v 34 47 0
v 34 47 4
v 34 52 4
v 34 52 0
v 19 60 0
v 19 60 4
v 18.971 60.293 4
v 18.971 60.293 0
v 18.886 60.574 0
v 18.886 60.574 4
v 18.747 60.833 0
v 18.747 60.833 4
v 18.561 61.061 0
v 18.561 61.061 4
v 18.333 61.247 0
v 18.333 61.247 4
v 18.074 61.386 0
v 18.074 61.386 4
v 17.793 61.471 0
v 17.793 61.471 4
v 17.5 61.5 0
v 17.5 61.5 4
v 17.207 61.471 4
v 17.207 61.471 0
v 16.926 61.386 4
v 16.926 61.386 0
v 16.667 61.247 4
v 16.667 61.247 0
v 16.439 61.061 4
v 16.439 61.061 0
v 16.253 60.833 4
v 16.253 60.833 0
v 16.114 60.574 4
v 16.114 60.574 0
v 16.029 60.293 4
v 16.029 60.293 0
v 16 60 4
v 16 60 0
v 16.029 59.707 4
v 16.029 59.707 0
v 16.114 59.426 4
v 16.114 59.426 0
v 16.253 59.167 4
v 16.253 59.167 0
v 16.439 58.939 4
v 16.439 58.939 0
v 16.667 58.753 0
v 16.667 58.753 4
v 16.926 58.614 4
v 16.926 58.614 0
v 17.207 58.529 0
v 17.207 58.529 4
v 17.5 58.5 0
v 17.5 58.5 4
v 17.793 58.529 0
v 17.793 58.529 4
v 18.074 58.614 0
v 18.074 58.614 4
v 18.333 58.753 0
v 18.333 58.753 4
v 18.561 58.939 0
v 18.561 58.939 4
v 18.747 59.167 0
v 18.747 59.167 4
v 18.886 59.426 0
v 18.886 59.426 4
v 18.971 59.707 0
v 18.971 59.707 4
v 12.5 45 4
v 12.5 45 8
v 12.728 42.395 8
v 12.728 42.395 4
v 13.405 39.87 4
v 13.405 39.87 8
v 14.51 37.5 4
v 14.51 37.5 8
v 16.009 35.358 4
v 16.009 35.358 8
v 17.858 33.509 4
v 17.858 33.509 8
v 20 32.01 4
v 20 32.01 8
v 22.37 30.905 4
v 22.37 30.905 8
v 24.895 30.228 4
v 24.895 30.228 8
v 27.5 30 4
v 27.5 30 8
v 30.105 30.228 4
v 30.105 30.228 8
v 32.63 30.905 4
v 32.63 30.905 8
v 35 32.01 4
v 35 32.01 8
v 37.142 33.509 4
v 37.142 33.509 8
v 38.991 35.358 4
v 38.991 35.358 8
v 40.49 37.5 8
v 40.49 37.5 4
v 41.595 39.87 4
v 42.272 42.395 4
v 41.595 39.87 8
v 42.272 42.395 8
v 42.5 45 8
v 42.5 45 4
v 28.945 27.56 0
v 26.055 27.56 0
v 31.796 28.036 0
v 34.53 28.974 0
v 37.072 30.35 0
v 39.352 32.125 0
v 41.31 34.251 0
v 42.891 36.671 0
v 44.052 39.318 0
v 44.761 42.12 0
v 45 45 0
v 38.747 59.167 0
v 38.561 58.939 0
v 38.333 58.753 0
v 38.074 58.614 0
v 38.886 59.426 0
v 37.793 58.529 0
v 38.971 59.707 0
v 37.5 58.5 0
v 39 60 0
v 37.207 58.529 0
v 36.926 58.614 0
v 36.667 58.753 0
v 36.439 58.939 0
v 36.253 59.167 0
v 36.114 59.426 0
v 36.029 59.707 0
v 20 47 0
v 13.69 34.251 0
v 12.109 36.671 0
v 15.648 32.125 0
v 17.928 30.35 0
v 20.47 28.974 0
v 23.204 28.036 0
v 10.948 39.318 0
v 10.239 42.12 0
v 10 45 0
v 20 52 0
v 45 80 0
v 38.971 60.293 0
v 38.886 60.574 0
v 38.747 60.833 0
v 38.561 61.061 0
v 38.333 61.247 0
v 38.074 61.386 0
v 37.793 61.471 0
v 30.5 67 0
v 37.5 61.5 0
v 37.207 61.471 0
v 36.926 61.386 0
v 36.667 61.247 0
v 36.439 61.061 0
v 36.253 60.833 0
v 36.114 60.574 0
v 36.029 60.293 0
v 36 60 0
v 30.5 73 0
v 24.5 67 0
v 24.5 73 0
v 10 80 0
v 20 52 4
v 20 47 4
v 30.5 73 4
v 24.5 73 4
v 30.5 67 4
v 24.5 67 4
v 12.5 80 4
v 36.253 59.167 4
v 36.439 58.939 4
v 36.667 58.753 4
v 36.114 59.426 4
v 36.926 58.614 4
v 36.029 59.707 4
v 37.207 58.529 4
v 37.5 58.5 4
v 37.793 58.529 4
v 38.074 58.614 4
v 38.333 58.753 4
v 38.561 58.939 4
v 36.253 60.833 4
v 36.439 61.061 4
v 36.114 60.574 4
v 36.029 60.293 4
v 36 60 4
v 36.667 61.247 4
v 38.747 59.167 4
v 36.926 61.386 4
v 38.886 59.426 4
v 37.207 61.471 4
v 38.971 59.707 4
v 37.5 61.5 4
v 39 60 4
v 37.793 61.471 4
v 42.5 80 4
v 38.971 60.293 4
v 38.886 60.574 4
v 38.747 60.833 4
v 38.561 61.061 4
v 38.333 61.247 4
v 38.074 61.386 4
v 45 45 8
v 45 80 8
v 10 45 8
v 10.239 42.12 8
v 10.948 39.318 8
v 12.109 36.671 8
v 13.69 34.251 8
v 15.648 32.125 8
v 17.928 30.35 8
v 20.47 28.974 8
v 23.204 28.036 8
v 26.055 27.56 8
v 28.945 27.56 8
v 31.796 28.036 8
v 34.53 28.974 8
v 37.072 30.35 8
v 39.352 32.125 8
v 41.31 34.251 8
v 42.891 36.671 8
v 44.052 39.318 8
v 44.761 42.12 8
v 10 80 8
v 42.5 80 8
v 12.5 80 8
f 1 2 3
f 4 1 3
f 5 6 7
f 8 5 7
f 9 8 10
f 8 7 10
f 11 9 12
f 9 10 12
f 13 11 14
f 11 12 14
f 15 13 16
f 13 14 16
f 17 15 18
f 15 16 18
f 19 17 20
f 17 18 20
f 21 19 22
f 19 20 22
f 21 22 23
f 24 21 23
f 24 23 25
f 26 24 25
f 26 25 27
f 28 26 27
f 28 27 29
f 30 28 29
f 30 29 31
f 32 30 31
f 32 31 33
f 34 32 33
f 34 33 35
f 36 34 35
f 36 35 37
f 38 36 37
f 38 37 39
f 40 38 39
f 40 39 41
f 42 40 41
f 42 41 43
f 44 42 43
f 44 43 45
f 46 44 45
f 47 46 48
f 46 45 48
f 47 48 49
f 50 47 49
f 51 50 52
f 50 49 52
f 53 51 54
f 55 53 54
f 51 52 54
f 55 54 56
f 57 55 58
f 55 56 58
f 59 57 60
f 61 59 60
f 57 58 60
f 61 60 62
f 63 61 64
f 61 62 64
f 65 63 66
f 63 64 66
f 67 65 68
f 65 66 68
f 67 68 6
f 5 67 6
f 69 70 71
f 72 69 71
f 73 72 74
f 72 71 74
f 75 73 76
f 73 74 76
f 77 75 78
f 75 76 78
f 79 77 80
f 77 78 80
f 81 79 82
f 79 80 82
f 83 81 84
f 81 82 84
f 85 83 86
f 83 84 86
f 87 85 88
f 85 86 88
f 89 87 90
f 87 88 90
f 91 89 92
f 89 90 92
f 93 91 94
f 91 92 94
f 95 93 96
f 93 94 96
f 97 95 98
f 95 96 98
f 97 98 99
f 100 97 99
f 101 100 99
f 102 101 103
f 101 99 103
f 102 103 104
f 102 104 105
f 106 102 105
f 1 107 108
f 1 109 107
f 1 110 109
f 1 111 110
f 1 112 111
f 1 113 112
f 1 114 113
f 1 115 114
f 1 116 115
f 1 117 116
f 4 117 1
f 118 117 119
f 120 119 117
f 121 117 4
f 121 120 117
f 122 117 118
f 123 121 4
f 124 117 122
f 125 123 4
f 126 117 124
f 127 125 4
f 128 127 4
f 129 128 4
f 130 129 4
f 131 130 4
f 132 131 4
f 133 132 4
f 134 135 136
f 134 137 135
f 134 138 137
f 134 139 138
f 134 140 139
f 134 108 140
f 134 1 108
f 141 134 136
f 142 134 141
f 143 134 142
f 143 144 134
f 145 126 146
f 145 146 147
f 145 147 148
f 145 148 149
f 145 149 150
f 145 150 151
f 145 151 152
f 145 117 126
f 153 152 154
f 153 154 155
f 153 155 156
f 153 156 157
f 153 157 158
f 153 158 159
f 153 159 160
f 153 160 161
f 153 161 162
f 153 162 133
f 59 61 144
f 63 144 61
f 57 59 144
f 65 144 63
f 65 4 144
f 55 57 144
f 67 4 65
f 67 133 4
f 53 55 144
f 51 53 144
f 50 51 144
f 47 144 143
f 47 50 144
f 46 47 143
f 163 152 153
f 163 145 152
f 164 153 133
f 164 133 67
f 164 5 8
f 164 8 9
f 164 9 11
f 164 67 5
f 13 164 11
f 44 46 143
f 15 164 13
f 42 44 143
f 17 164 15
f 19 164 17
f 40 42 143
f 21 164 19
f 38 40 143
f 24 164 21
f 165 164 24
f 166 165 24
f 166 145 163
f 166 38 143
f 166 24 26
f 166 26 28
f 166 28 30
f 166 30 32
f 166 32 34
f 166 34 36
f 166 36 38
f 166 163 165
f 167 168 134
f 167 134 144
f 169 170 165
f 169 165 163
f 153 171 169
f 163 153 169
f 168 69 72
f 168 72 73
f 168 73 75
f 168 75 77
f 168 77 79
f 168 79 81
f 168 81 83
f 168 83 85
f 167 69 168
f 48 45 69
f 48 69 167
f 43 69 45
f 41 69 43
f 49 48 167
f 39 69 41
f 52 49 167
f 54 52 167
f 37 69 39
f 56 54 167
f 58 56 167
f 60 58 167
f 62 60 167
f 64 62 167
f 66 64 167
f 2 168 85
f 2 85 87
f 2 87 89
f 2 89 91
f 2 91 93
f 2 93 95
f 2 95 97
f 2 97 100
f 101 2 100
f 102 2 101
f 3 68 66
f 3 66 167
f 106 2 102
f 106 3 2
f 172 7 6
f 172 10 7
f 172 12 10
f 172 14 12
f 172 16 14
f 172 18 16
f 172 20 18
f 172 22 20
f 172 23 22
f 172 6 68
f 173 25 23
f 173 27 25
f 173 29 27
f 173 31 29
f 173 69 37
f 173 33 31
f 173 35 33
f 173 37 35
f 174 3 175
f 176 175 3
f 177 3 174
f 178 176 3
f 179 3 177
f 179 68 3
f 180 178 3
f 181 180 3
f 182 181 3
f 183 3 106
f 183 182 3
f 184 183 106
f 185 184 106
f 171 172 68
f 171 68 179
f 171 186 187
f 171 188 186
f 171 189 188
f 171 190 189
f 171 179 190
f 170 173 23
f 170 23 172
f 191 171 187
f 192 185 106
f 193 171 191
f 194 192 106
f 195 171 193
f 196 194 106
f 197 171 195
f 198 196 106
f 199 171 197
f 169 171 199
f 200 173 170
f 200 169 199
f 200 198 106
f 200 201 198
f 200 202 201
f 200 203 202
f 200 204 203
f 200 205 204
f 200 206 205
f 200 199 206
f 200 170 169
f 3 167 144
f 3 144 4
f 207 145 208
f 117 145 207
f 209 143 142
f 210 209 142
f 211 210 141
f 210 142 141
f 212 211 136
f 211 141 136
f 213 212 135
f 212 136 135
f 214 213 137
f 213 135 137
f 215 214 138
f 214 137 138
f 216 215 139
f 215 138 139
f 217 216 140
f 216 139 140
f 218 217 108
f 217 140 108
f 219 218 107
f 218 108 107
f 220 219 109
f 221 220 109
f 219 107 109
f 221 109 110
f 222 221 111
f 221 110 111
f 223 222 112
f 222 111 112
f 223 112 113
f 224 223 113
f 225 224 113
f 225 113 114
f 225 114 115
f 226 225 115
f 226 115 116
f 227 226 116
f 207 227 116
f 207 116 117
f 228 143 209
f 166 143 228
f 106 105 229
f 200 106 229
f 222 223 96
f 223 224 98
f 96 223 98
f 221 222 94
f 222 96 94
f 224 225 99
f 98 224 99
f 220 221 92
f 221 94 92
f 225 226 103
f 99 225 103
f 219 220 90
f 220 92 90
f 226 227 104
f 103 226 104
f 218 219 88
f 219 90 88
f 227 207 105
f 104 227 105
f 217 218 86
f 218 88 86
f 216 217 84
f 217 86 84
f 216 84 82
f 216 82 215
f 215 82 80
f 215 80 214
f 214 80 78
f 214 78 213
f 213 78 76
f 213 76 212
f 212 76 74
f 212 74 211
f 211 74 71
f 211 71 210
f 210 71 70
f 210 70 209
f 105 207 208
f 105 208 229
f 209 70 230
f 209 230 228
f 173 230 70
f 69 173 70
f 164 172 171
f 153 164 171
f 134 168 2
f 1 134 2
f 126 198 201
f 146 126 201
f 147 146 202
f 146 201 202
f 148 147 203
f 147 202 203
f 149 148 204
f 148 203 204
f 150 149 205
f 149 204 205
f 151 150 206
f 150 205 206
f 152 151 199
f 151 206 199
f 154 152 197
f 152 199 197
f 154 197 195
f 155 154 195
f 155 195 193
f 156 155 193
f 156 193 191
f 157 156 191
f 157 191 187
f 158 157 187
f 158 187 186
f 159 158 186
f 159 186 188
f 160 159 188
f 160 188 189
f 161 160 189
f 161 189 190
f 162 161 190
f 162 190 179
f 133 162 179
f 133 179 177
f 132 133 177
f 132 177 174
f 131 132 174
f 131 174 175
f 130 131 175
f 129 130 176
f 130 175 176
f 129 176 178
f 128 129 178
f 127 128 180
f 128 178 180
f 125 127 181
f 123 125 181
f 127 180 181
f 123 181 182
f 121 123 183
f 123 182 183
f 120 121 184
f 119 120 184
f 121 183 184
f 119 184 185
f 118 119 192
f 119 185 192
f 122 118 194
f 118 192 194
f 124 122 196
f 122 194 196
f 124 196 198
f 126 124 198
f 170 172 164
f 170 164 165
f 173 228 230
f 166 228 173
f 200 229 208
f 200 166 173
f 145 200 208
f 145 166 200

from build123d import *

# Parameters (mm, degrees)
PAD_DEPTH       = 8
POCKET_DEPTH    = 4
SKETCH002_R     = 1.5
SKETCH002_W     = 14
SKETCH002_H     = 5
SKETCH002_W_2   = 6
SKETCH002_H_2   = 6
POCKET001_DEPTH = 5


with BuildPart() as part:
    # Sketch → Pad (new body)
    with BuildSketch(Plane.XY):
        with BuildLine():
            Line((10, 80), (10, 80.00008))
            Line((10, 80.00008), (45, 80.00008))
            Line((45, 80.00008), (45, 45.00008))
            ThreePointArc((10, 45), (27.50004, 27.500049), (45, 45.00008))
            Line((10, 45), (10, 80))
        make_face()
    extrude(amount=PAD_DEPTH)

    # Sketch001 (on Face7 of Pad) → Pocket (cut)
    with BuildSketch(Plane.XY.offset(8)):
        with BuildLine():
            Line((12.5, 80.00008), (12.5, 45))
            ThreePointArc((12.5, 45), (27.50004, 30), (42.5, 45.00008))
            Line((42.5, 45.00008), (42.5, 80.00008))
            Line((42.5, 80.00008), (12.5, 80.00008))
        make_face()
    extrude(amount=-POCKET_DEPTH, mode=Mode.SUBTRACT)

    # Sketch002 (on Face9 of Pocket) → Pocket001 (cut)
    with BuildSketch(Plane.XY.offset(4)):
        with Locations((17.5, 60.00008)):
            Circle(SKETCH002_R)
        with Locations((37.5, 60.00008)):
            Circle(SKETCH002_R)
        with Locations((27, 49.50008)):
            Rectangle(SKETCH002_W, SKETCH002_H)
        with Locations((27.5, 70.00008)):
            Rectangle(SKETCH002_W_2, SKETCH002_H_2)
    extrude(amount=-POCKET001_DEPTH, mode=Mode.SUBTRACT)


solid = part.part
